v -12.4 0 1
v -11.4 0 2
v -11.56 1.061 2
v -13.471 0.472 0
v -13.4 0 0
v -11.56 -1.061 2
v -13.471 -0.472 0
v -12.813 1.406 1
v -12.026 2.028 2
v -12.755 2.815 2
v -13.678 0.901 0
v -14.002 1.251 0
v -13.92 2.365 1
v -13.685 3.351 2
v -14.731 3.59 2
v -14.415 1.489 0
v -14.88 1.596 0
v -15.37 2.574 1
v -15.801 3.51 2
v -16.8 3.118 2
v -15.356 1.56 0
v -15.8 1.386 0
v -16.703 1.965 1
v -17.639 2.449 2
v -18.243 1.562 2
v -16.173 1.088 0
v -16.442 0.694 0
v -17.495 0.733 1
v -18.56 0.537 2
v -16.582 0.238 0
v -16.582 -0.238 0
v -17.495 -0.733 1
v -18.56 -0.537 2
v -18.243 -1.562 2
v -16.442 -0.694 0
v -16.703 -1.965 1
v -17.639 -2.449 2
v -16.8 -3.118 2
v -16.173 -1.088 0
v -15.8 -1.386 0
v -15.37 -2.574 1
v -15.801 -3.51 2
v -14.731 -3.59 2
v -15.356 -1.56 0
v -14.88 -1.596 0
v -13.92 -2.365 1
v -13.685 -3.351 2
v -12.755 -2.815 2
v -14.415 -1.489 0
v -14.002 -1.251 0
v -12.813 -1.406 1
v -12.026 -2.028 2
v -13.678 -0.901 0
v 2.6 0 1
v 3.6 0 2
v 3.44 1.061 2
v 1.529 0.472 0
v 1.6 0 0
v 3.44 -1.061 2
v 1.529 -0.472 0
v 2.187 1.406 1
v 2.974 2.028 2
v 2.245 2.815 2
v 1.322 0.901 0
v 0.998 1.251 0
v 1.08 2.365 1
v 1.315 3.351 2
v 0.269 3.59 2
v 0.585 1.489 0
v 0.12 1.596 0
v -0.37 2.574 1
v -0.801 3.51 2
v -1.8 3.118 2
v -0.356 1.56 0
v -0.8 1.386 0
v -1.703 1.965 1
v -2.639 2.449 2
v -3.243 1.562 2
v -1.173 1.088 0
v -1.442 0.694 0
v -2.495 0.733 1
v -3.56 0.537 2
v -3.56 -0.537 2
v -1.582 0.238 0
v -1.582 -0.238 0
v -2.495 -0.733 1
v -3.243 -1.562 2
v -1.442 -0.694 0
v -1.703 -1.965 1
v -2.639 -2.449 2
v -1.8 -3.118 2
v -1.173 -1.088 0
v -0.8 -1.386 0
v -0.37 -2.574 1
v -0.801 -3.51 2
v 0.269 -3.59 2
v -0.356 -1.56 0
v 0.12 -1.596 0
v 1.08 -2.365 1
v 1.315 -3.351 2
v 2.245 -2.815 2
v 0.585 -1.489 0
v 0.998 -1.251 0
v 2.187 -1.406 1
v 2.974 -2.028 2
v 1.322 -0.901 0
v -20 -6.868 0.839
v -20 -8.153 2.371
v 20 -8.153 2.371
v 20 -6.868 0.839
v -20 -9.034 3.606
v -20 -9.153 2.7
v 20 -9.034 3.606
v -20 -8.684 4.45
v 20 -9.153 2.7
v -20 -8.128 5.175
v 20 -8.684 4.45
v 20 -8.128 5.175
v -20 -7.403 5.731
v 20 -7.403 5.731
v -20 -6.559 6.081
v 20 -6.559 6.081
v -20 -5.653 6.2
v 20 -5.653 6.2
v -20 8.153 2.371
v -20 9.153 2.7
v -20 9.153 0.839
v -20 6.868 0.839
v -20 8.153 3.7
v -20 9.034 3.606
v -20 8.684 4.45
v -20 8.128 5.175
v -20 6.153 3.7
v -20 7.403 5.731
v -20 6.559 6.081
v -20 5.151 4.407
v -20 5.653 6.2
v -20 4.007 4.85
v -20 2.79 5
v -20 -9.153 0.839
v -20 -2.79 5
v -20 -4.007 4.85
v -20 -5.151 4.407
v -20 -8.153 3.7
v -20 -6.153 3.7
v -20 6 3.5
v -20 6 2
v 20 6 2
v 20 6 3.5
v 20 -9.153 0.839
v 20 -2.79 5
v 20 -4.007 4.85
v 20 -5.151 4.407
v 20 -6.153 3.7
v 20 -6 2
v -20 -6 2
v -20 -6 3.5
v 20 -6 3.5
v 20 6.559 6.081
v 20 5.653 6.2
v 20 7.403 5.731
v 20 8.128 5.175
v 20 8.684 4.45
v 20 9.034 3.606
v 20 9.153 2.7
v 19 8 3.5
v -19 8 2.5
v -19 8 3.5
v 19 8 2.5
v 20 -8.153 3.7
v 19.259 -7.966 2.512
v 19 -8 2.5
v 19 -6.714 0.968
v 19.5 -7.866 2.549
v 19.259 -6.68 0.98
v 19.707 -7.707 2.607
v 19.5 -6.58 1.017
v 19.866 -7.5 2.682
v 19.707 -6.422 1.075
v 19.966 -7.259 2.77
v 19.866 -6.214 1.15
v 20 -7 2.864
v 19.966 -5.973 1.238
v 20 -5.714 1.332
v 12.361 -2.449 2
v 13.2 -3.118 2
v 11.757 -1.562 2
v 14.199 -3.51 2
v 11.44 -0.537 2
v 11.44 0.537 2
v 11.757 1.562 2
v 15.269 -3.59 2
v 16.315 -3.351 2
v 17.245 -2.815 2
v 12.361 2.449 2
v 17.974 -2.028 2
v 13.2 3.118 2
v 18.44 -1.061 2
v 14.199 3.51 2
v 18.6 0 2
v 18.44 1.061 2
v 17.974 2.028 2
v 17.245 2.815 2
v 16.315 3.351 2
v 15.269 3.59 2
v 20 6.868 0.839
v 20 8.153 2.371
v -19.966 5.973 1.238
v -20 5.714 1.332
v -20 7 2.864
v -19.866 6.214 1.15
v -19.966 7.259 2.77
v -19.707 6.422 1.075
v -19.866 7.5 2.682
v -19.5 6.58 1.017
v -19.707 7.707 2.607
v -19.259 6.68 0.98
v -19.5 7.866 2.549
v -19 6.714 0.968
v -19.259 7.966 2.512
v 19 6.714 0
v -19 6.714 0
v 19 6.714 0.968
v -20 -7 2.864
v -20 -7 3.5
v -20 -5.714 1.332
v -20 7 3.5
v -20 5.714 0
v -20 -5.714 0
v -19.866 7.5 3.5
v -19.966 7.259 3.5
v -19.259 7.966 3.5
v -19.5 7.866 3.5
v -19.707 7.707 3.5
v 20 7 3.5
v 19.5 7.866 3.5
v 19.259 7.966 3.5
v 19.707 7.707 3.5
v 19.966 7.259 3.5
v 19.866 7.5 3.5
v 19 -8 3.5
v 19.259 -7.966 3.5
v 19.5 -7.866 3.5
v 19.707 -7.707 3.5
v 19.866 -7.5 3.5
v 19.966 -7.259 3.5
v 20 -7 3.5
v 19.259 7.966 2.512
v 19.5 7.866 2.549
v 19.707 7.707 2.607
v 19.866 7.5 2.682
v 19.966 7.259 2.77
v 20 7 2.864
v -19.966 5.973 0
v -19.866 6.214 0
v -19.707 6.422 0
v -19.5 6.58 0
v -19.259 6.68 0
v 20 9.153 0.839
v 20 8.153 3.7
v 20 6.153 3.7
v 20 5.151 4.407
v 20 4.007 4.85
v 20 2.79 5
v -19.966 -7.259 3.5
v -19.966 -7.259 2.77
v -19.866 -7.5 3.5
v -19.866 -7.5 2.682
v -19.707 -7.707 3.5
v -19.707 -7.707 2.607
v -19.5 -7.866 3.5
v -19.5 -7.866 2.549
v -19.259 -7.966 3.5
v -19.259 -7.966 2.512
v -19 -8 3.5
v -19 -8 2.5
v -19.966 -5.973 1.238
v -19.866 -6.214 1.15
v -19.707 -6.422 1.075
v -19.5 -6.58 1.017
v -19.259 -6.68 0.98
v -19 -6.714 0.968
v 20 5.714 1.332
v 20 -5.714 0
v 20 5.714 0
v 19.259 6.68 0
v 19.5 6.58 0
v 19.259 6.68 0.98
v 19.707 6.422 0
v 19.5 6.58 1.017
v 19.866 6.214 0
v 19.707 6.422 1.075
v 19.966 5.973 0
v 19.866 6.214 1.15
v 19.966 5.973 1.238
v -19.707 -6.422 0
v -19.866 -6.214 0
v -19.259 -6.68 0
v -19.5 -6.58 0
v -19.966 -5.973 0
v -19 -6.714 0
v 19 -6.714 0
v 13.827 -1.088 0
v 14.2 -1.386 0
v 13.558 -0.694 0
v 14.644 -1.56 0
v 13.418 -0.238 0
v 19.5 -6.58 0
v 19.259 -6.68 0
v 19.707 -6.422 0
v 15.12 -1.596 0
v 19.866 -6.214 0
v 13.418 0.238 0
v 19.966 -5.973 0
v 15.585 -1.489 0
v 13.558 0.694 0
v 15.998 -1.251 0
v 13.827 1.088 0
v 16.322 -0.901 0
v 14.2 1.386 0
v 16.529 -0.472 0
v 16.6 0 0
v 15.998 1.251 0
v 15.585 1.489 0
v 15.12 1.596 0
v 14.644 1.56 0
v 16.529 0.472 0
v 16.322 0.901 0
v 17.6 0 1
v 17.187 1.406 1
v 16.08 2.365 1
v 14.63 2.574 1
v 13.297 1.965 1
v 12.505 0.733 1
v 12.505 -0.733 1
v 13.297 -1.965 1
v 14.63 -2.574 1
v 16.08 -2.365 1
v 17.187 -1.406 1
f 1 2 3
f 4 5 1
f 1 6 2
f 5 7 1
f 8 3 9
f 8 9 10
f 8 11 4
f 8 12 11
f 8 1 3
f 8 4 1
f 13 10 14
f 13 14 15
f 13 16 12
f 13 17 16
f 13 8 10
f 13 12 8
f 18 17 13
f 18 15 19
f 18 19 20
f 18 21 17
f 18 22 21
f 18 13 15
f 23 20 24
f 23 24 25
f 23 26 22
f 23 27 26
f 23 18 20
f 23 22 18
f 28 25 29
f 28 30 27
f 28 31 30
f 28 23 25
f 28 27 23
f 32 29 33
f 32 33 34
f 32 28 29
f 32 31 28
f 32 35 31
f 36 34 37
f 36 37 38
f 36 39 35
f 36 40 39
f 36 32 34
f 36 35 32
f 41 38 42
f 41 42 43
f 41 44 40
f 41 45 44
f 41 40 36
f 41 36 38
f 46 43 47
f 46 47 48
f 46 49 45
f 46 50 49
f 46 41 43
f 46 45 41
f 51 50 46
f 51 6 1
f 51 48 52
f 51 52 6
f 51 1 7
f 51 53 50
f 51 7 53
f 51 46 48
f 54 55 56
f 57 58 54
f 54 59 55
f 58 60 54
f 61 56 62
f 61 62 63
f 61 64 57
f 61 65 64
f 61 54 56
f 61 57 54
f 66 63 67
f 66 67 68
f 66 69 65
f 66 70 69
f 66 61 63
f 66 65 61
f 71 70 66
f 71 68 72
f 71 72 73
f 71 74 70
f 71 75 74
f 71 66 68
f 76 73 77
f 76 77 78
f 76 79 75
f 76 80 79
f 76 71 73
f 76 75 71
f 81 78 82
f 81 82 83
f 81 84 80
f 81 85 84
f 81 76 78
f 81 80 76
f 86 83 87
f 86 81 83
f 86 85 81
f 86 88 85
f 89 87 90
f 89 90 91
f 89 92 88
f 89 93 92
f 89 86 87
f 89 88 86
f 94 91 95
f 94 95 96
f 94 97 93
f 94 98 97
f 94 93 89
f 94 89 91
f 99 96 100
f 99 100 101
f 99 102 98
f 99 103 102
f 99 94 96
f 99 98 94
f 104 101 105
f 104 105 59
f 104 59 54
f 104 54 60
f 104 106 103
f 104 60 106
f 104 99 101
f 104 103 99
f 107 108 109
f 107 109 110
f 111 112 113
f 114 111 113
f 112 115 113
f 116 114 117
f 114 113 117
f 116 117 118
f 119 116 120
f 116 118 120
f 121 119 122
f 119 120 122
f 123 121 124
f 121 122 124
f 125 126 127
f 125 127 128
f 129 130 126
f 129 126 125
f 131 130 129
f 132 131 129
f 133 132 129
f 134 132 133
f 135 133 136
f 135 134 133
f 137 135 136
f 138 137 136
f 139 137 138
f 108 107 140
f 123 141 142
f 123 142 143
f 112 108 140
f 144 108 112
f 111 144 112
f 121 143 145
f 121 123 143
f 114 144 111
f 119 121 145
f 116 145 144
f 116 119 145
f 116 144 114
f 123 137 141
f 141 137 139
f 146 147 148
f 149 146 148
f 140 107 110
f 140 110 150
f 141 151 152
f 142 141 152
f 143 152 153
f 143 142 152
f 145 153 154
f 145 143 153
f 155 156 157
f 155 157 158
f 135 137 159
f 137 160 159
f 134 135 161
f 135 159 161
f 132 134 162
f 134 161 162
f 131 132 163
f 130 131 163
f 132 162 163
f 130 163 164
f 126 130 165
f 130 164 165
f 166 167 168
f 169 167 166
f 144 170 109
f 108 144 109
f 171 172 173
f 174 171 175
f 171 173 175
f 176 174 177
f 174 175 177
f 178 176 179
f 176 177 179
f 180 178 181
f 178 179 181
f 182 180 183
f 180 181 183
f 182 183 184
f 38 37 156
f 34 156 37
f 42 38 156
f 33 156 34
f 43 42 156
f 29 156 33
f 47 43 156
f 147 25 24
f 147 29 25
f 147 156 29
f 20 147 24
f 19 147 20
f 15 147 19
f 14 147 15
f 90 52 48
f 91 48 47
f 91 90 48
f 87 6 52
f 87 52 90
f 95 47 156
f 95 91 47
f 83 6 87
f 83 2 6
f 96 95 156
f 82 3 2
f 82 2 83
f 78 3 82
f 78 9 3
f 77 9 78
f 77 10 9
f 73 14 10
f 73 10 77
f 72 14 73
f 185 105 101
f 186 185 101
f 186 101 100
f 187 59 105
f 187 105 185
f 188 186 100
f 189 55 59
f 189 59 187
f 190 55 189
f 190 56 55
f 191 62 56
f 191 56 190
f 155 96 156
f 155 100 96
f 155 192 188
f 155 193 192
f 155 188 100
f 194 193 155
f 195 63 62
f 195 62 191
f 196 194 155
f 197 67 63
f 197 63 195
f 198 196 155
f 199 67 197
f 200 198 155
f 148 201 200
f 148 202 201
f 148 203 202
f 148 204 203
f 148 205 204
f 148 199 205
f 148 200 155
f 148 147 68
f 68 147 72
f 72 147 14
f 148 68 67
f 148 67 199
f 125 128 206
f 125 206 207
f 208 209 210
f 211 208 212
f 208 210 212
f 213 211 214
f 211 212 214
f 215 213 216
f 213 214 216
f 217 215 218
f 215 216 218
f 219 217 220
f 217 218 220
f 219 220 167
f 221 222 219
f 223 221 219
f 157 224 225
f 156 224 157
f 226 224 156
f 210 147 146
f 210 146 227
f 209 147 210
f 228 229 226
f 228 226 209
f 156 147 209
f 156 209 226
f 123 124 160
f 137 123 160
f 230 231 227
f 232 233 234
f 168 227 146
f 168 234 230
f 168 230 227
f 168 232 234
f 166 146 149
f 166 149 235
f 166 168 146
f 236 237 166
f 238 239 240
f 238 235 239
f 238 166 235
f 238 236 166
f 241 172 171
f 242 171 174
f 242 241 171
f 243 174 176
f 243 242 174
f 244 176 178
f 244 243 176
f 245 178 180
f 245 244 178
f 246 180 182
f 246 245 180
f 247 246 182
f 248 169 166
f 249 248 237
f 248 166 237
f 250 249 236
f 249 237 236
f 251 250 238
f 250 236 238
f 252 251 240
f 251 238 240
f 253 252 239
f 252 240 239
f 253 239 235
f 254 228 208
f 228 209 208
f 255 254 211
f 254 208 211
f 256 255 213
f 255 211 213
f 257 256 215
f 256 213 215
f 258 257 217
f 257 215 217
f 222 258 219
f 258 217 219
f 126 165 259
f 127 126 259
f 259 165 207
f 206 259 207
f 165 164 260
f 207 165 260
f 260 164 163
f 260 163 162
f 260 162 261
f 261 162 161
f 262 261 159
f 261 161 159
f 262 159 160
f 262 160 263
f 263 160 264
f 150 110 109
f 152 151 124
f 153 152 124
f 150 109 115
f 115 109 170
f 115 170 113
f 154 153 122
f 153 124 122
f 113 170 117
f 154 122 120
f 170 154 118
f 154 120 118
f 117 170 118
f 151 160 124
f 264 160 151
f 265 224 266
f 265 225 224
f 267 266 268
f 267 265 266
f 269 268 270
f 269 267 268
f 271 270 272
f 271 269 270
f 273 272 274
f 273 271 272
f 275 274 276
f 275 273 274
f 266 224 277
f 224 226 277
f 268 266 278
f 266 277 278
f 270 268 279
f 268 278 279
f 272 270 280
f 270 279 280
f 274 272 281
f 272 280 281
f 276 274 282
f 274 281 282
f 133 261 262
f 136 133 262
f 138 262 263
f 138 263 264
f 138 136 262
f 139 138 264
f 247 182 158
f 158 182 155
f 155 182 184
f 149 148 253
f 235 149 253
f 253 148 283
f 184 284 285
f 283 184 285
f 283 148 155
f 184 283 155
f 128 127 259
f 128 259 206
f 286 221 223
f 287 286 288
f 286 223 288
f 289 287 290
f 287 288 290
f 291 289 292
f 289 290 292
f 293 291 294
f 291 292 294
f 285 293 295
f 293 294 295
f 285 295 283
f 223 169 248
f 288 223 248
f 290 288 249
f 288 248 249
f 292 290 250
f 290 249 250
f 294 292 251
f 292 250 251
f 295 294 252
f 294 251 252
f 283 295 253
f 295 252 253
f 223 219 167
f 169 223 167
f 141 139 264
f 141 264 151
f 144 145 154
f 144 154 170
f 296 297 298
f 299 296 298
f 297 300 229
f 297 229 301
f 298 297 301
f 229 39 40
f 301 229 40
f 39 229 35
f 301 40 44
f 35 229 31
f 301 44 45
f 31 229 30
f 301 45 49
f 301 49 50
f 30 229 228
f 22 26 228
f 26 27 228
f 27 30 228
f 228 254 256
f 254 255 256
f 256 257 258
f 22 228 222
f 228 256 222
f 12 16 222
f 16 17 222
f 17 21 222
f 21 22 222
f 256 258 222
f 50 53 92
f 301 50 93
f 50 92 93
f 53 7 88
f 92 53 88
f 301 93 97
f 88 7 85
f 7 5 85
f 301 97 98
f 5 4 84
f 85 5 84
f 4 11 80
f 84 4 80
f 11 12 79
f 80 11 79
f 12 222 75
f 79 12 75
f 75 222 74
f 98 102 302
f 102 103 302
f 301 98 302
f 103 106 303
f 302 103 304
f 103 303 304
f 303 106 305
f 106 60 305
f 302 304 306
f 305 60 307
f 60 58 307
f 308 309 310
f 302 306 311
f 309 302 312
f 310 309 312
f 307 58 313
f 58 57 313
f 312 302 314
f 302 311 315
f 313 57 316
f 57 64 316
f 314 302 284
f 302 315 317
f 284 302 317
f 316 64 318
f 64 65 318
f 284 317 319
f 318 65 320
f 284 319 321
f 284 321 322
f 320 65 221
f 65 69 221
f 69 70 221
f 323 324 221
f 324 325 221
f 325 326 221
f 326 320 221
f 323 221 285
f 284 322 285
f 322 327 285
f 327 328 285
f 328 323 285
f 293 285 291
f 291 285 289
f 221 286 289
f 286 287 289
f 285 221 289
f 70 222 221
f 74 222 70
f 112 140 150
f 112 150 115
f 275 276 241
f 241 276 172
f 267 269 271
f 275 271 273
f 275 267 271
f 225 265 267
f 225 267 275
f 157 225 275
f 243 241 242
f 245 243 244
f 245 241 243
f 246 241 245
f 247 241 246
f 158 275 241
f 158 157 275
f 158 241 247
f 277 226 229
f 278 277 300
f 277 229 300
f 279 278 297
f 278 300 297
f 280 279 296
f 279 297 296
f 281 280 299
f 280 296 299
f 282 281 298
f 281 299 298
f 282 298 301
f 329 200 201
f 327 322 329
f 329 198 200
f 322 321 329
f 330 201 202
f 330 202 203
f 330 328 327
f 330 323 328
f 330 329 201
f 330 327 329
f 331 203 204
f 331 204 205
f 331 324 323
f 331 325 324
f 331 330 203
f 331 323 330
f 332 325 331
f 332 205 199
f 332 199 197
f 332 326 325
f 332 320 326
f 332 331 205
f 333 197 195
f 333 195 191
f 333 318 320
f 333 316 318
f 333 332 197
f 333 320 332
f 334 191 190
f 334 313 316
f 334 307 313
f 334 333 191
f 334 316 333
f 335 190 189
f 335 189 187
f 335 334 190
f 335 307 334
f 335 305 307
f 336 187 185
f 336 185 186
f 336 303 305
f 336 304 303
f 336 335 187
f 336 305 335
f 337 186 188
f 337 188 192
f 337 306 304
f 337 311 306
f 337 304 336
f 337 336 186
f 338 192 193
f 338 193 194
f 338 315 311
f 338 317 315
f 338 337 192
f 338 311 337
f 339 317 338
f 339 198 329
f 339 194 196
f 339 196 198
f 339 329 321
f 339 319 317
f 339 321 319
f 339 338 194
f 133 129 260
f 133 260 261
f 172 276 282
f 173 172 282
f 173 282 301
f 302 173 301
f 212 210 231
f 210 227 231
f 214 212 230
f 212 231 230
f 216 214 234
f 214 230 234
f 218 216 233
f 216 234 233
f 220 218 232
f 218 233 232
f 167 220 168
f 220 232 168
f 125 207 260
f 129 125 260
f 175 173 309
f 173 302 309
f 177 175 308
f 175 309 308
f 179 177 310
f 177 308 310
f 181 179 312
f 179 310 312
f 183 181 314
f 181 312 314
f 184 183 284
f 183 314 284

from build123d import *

# Parameters (mm, degrees)
F1_W         = 40
F1_H         = 12
F1_R         = 1.6
F2_DEPTH     = 2
F1_H_2       = 2
F3_DEPTH     = 3.5
F5_DEPTH     = 282.2
F7_DEPTH     = 40
F8_R         = 1
F9_SIZE      = 1.99999
F10_T1_DEPTH = 40
F11_R        = 3.5


# Not quite as in the source:
# - a fillet or chamfer that OpenCascade refuses, or shapes differently, is made with other operations: its cross-section is extruded or revolved along the edge and cut away or added
# - a fillet or chamfer is up to 0.001 mm smaller than in the source, because OpenCascade refuses the exact size


with BuildPart() as f2:
    # F1 (on Top) → F2 (new body)
    with BuildSketch(Plane.XY):
        Rectangle(F1_W, F1_H)
        with Locations((-15, 0)):
            Circle(F1_R, mode=Mode.SUBTRACT)
        Circle(F1_R, mode=Mode.SUBTRACT)
        with Locations((15, 0)):
            Circle(F1_R, mode=Mode.SUBTRACT)
    extrude(amount=F2_DEPTH)

    # F1 (on Top) → F3 (join)
    with BuildSketch(Plane.XY):
        with Locations((0, 7)):
            Rectangle(F1_W, F1_H_2)
        with Locations((0, -7)):
            Rectangle(F1_W, F1_H_2)
    extrude(amount=F3_DEPTH)

    # F4 (on face) → F5 (cut)
    with BuildSketch(Plane(origin=(-20, 0, 0), x_dir=(0, -1, 0), z_dir=(-1, 0, 0))):
        Polygon((-6.7144247806, 0.9679111138), (-8, 2.5), (-8, 0), (-6.7144247806, 0), align=None)
        Polygon((6.7144247806, 0.9679111138), (6.7144247806, 0), (8, 0), (8, 2.5), align=None)
    extrude(amount=-F5_DEPTH, mode=Mode.SUBTRACT)

    # F8
    f8_edges = [f2.edges().sort_by_distance(p)[0] for p in [
        (20, -8, 3),
        (20, -6.714425, 0.483956),
        (20, -7.357212, 1.733956),
        (20, 8, 3),
        (20, 7.357212, 1.733956),
        (20, 6.714425, 0.483956),
        (-20, 8, 3),
        (-20, 7.357212, 1.733956),
        (-20, 6.714425, 0.483956),
        (-20, -7.357212, 1.733956),
        (-20, -6.714425, 0.483956),
        (-20, -8, 3),
    ]]
    fillet(f8_edges, radius=F8_R)

    # F9 (size 2 in the source; OpenCascade refuses exactly that, so slightly less here)
    f9_edges = [f2.edges().sort_by_distance(p)[0] for p in [
        (-16.6, 0, 2),
        (-1.6, 0, 2),
        (13.4, 0, 2),
    ]]
    chamfer(f9_edges, length=F9_SIZE)


with BuildPart() as f7:
    # F6 (on face) → F7 (new body)
    with BuildSketch(Plane(origin=(-20, 0, 0), x_dir=(0, -1, 0), z_dir=(-1, 0, 0))):
        Polygon((-6.8676336693, 0.8393535918), (-8.1532088886, 2.3714424781), (-8.1532088886, 3.7), (-8.1532088886, 5), (-7.2440384092, 5), (0, 5), (7.2440384092, 5), (8.1532088886, 5), (8.1532088886, 3.7), (8.1532088886, 2.3714424781), (6.8676336693, 0.8393535918), (9.1532088886, 0.8393535918), (9.1532088886, 6.2), (0, 6.2), (-9.1532088886, 6.2), (-9.1532088886, 0.8393535918), align=None)
        Polygon((-8.1532088886, 5), (-8.1532088886, 3.7), (-6.1532088886, 3.7), (-7.2440384092, 5), align=None)
        Polygon((8.1532088886, 5), (7.2440384092, 5), (6.1532088886, 3.7), (8.1532088886, 3.7), align=None)
    extrude(amount=-F7_DEPTH)

    # F10: fillet of radius 5 on 2 edges, made by hand

    # F10_s2 → F10_t1 (join)
    with BuildSketch(Plane.YZ.offset(-20)):
        with BuildLine():
            ThreePointArc((6.1532088886, 3.7), (4.5929501822, 4.6636895265), (2.7901745445, 5))
            Line((2.7901745445, 5), (7.2440384092, 5))
            Line((7.2440384092, 5), (6.1532088886, 3.7))
        make_face()
        with BuildLine():
            ThreePointArc((-2.7901745445, 5), (-4.5929501822, 4.6636895265), (-6.1532088886, 3.7))
            Line((-6.1532088886, 3.7), (-7.2440384092, 5))
            Line((-7.2440384092, 5), (-2.7901745445, 5))
        make_face()
    extrude(amount=F10_T1_DEPTH)

    # F11
    f11_edges = [f7.edges().sort_by_distance(p)[0] for p in [
        (0, -9.153209, 6.2),
        (0, 9.153209, 6.2),
    ]]
    fillet(f11_edges, radius=F11_R)


solid = Compound([f2.part, f7.part])
